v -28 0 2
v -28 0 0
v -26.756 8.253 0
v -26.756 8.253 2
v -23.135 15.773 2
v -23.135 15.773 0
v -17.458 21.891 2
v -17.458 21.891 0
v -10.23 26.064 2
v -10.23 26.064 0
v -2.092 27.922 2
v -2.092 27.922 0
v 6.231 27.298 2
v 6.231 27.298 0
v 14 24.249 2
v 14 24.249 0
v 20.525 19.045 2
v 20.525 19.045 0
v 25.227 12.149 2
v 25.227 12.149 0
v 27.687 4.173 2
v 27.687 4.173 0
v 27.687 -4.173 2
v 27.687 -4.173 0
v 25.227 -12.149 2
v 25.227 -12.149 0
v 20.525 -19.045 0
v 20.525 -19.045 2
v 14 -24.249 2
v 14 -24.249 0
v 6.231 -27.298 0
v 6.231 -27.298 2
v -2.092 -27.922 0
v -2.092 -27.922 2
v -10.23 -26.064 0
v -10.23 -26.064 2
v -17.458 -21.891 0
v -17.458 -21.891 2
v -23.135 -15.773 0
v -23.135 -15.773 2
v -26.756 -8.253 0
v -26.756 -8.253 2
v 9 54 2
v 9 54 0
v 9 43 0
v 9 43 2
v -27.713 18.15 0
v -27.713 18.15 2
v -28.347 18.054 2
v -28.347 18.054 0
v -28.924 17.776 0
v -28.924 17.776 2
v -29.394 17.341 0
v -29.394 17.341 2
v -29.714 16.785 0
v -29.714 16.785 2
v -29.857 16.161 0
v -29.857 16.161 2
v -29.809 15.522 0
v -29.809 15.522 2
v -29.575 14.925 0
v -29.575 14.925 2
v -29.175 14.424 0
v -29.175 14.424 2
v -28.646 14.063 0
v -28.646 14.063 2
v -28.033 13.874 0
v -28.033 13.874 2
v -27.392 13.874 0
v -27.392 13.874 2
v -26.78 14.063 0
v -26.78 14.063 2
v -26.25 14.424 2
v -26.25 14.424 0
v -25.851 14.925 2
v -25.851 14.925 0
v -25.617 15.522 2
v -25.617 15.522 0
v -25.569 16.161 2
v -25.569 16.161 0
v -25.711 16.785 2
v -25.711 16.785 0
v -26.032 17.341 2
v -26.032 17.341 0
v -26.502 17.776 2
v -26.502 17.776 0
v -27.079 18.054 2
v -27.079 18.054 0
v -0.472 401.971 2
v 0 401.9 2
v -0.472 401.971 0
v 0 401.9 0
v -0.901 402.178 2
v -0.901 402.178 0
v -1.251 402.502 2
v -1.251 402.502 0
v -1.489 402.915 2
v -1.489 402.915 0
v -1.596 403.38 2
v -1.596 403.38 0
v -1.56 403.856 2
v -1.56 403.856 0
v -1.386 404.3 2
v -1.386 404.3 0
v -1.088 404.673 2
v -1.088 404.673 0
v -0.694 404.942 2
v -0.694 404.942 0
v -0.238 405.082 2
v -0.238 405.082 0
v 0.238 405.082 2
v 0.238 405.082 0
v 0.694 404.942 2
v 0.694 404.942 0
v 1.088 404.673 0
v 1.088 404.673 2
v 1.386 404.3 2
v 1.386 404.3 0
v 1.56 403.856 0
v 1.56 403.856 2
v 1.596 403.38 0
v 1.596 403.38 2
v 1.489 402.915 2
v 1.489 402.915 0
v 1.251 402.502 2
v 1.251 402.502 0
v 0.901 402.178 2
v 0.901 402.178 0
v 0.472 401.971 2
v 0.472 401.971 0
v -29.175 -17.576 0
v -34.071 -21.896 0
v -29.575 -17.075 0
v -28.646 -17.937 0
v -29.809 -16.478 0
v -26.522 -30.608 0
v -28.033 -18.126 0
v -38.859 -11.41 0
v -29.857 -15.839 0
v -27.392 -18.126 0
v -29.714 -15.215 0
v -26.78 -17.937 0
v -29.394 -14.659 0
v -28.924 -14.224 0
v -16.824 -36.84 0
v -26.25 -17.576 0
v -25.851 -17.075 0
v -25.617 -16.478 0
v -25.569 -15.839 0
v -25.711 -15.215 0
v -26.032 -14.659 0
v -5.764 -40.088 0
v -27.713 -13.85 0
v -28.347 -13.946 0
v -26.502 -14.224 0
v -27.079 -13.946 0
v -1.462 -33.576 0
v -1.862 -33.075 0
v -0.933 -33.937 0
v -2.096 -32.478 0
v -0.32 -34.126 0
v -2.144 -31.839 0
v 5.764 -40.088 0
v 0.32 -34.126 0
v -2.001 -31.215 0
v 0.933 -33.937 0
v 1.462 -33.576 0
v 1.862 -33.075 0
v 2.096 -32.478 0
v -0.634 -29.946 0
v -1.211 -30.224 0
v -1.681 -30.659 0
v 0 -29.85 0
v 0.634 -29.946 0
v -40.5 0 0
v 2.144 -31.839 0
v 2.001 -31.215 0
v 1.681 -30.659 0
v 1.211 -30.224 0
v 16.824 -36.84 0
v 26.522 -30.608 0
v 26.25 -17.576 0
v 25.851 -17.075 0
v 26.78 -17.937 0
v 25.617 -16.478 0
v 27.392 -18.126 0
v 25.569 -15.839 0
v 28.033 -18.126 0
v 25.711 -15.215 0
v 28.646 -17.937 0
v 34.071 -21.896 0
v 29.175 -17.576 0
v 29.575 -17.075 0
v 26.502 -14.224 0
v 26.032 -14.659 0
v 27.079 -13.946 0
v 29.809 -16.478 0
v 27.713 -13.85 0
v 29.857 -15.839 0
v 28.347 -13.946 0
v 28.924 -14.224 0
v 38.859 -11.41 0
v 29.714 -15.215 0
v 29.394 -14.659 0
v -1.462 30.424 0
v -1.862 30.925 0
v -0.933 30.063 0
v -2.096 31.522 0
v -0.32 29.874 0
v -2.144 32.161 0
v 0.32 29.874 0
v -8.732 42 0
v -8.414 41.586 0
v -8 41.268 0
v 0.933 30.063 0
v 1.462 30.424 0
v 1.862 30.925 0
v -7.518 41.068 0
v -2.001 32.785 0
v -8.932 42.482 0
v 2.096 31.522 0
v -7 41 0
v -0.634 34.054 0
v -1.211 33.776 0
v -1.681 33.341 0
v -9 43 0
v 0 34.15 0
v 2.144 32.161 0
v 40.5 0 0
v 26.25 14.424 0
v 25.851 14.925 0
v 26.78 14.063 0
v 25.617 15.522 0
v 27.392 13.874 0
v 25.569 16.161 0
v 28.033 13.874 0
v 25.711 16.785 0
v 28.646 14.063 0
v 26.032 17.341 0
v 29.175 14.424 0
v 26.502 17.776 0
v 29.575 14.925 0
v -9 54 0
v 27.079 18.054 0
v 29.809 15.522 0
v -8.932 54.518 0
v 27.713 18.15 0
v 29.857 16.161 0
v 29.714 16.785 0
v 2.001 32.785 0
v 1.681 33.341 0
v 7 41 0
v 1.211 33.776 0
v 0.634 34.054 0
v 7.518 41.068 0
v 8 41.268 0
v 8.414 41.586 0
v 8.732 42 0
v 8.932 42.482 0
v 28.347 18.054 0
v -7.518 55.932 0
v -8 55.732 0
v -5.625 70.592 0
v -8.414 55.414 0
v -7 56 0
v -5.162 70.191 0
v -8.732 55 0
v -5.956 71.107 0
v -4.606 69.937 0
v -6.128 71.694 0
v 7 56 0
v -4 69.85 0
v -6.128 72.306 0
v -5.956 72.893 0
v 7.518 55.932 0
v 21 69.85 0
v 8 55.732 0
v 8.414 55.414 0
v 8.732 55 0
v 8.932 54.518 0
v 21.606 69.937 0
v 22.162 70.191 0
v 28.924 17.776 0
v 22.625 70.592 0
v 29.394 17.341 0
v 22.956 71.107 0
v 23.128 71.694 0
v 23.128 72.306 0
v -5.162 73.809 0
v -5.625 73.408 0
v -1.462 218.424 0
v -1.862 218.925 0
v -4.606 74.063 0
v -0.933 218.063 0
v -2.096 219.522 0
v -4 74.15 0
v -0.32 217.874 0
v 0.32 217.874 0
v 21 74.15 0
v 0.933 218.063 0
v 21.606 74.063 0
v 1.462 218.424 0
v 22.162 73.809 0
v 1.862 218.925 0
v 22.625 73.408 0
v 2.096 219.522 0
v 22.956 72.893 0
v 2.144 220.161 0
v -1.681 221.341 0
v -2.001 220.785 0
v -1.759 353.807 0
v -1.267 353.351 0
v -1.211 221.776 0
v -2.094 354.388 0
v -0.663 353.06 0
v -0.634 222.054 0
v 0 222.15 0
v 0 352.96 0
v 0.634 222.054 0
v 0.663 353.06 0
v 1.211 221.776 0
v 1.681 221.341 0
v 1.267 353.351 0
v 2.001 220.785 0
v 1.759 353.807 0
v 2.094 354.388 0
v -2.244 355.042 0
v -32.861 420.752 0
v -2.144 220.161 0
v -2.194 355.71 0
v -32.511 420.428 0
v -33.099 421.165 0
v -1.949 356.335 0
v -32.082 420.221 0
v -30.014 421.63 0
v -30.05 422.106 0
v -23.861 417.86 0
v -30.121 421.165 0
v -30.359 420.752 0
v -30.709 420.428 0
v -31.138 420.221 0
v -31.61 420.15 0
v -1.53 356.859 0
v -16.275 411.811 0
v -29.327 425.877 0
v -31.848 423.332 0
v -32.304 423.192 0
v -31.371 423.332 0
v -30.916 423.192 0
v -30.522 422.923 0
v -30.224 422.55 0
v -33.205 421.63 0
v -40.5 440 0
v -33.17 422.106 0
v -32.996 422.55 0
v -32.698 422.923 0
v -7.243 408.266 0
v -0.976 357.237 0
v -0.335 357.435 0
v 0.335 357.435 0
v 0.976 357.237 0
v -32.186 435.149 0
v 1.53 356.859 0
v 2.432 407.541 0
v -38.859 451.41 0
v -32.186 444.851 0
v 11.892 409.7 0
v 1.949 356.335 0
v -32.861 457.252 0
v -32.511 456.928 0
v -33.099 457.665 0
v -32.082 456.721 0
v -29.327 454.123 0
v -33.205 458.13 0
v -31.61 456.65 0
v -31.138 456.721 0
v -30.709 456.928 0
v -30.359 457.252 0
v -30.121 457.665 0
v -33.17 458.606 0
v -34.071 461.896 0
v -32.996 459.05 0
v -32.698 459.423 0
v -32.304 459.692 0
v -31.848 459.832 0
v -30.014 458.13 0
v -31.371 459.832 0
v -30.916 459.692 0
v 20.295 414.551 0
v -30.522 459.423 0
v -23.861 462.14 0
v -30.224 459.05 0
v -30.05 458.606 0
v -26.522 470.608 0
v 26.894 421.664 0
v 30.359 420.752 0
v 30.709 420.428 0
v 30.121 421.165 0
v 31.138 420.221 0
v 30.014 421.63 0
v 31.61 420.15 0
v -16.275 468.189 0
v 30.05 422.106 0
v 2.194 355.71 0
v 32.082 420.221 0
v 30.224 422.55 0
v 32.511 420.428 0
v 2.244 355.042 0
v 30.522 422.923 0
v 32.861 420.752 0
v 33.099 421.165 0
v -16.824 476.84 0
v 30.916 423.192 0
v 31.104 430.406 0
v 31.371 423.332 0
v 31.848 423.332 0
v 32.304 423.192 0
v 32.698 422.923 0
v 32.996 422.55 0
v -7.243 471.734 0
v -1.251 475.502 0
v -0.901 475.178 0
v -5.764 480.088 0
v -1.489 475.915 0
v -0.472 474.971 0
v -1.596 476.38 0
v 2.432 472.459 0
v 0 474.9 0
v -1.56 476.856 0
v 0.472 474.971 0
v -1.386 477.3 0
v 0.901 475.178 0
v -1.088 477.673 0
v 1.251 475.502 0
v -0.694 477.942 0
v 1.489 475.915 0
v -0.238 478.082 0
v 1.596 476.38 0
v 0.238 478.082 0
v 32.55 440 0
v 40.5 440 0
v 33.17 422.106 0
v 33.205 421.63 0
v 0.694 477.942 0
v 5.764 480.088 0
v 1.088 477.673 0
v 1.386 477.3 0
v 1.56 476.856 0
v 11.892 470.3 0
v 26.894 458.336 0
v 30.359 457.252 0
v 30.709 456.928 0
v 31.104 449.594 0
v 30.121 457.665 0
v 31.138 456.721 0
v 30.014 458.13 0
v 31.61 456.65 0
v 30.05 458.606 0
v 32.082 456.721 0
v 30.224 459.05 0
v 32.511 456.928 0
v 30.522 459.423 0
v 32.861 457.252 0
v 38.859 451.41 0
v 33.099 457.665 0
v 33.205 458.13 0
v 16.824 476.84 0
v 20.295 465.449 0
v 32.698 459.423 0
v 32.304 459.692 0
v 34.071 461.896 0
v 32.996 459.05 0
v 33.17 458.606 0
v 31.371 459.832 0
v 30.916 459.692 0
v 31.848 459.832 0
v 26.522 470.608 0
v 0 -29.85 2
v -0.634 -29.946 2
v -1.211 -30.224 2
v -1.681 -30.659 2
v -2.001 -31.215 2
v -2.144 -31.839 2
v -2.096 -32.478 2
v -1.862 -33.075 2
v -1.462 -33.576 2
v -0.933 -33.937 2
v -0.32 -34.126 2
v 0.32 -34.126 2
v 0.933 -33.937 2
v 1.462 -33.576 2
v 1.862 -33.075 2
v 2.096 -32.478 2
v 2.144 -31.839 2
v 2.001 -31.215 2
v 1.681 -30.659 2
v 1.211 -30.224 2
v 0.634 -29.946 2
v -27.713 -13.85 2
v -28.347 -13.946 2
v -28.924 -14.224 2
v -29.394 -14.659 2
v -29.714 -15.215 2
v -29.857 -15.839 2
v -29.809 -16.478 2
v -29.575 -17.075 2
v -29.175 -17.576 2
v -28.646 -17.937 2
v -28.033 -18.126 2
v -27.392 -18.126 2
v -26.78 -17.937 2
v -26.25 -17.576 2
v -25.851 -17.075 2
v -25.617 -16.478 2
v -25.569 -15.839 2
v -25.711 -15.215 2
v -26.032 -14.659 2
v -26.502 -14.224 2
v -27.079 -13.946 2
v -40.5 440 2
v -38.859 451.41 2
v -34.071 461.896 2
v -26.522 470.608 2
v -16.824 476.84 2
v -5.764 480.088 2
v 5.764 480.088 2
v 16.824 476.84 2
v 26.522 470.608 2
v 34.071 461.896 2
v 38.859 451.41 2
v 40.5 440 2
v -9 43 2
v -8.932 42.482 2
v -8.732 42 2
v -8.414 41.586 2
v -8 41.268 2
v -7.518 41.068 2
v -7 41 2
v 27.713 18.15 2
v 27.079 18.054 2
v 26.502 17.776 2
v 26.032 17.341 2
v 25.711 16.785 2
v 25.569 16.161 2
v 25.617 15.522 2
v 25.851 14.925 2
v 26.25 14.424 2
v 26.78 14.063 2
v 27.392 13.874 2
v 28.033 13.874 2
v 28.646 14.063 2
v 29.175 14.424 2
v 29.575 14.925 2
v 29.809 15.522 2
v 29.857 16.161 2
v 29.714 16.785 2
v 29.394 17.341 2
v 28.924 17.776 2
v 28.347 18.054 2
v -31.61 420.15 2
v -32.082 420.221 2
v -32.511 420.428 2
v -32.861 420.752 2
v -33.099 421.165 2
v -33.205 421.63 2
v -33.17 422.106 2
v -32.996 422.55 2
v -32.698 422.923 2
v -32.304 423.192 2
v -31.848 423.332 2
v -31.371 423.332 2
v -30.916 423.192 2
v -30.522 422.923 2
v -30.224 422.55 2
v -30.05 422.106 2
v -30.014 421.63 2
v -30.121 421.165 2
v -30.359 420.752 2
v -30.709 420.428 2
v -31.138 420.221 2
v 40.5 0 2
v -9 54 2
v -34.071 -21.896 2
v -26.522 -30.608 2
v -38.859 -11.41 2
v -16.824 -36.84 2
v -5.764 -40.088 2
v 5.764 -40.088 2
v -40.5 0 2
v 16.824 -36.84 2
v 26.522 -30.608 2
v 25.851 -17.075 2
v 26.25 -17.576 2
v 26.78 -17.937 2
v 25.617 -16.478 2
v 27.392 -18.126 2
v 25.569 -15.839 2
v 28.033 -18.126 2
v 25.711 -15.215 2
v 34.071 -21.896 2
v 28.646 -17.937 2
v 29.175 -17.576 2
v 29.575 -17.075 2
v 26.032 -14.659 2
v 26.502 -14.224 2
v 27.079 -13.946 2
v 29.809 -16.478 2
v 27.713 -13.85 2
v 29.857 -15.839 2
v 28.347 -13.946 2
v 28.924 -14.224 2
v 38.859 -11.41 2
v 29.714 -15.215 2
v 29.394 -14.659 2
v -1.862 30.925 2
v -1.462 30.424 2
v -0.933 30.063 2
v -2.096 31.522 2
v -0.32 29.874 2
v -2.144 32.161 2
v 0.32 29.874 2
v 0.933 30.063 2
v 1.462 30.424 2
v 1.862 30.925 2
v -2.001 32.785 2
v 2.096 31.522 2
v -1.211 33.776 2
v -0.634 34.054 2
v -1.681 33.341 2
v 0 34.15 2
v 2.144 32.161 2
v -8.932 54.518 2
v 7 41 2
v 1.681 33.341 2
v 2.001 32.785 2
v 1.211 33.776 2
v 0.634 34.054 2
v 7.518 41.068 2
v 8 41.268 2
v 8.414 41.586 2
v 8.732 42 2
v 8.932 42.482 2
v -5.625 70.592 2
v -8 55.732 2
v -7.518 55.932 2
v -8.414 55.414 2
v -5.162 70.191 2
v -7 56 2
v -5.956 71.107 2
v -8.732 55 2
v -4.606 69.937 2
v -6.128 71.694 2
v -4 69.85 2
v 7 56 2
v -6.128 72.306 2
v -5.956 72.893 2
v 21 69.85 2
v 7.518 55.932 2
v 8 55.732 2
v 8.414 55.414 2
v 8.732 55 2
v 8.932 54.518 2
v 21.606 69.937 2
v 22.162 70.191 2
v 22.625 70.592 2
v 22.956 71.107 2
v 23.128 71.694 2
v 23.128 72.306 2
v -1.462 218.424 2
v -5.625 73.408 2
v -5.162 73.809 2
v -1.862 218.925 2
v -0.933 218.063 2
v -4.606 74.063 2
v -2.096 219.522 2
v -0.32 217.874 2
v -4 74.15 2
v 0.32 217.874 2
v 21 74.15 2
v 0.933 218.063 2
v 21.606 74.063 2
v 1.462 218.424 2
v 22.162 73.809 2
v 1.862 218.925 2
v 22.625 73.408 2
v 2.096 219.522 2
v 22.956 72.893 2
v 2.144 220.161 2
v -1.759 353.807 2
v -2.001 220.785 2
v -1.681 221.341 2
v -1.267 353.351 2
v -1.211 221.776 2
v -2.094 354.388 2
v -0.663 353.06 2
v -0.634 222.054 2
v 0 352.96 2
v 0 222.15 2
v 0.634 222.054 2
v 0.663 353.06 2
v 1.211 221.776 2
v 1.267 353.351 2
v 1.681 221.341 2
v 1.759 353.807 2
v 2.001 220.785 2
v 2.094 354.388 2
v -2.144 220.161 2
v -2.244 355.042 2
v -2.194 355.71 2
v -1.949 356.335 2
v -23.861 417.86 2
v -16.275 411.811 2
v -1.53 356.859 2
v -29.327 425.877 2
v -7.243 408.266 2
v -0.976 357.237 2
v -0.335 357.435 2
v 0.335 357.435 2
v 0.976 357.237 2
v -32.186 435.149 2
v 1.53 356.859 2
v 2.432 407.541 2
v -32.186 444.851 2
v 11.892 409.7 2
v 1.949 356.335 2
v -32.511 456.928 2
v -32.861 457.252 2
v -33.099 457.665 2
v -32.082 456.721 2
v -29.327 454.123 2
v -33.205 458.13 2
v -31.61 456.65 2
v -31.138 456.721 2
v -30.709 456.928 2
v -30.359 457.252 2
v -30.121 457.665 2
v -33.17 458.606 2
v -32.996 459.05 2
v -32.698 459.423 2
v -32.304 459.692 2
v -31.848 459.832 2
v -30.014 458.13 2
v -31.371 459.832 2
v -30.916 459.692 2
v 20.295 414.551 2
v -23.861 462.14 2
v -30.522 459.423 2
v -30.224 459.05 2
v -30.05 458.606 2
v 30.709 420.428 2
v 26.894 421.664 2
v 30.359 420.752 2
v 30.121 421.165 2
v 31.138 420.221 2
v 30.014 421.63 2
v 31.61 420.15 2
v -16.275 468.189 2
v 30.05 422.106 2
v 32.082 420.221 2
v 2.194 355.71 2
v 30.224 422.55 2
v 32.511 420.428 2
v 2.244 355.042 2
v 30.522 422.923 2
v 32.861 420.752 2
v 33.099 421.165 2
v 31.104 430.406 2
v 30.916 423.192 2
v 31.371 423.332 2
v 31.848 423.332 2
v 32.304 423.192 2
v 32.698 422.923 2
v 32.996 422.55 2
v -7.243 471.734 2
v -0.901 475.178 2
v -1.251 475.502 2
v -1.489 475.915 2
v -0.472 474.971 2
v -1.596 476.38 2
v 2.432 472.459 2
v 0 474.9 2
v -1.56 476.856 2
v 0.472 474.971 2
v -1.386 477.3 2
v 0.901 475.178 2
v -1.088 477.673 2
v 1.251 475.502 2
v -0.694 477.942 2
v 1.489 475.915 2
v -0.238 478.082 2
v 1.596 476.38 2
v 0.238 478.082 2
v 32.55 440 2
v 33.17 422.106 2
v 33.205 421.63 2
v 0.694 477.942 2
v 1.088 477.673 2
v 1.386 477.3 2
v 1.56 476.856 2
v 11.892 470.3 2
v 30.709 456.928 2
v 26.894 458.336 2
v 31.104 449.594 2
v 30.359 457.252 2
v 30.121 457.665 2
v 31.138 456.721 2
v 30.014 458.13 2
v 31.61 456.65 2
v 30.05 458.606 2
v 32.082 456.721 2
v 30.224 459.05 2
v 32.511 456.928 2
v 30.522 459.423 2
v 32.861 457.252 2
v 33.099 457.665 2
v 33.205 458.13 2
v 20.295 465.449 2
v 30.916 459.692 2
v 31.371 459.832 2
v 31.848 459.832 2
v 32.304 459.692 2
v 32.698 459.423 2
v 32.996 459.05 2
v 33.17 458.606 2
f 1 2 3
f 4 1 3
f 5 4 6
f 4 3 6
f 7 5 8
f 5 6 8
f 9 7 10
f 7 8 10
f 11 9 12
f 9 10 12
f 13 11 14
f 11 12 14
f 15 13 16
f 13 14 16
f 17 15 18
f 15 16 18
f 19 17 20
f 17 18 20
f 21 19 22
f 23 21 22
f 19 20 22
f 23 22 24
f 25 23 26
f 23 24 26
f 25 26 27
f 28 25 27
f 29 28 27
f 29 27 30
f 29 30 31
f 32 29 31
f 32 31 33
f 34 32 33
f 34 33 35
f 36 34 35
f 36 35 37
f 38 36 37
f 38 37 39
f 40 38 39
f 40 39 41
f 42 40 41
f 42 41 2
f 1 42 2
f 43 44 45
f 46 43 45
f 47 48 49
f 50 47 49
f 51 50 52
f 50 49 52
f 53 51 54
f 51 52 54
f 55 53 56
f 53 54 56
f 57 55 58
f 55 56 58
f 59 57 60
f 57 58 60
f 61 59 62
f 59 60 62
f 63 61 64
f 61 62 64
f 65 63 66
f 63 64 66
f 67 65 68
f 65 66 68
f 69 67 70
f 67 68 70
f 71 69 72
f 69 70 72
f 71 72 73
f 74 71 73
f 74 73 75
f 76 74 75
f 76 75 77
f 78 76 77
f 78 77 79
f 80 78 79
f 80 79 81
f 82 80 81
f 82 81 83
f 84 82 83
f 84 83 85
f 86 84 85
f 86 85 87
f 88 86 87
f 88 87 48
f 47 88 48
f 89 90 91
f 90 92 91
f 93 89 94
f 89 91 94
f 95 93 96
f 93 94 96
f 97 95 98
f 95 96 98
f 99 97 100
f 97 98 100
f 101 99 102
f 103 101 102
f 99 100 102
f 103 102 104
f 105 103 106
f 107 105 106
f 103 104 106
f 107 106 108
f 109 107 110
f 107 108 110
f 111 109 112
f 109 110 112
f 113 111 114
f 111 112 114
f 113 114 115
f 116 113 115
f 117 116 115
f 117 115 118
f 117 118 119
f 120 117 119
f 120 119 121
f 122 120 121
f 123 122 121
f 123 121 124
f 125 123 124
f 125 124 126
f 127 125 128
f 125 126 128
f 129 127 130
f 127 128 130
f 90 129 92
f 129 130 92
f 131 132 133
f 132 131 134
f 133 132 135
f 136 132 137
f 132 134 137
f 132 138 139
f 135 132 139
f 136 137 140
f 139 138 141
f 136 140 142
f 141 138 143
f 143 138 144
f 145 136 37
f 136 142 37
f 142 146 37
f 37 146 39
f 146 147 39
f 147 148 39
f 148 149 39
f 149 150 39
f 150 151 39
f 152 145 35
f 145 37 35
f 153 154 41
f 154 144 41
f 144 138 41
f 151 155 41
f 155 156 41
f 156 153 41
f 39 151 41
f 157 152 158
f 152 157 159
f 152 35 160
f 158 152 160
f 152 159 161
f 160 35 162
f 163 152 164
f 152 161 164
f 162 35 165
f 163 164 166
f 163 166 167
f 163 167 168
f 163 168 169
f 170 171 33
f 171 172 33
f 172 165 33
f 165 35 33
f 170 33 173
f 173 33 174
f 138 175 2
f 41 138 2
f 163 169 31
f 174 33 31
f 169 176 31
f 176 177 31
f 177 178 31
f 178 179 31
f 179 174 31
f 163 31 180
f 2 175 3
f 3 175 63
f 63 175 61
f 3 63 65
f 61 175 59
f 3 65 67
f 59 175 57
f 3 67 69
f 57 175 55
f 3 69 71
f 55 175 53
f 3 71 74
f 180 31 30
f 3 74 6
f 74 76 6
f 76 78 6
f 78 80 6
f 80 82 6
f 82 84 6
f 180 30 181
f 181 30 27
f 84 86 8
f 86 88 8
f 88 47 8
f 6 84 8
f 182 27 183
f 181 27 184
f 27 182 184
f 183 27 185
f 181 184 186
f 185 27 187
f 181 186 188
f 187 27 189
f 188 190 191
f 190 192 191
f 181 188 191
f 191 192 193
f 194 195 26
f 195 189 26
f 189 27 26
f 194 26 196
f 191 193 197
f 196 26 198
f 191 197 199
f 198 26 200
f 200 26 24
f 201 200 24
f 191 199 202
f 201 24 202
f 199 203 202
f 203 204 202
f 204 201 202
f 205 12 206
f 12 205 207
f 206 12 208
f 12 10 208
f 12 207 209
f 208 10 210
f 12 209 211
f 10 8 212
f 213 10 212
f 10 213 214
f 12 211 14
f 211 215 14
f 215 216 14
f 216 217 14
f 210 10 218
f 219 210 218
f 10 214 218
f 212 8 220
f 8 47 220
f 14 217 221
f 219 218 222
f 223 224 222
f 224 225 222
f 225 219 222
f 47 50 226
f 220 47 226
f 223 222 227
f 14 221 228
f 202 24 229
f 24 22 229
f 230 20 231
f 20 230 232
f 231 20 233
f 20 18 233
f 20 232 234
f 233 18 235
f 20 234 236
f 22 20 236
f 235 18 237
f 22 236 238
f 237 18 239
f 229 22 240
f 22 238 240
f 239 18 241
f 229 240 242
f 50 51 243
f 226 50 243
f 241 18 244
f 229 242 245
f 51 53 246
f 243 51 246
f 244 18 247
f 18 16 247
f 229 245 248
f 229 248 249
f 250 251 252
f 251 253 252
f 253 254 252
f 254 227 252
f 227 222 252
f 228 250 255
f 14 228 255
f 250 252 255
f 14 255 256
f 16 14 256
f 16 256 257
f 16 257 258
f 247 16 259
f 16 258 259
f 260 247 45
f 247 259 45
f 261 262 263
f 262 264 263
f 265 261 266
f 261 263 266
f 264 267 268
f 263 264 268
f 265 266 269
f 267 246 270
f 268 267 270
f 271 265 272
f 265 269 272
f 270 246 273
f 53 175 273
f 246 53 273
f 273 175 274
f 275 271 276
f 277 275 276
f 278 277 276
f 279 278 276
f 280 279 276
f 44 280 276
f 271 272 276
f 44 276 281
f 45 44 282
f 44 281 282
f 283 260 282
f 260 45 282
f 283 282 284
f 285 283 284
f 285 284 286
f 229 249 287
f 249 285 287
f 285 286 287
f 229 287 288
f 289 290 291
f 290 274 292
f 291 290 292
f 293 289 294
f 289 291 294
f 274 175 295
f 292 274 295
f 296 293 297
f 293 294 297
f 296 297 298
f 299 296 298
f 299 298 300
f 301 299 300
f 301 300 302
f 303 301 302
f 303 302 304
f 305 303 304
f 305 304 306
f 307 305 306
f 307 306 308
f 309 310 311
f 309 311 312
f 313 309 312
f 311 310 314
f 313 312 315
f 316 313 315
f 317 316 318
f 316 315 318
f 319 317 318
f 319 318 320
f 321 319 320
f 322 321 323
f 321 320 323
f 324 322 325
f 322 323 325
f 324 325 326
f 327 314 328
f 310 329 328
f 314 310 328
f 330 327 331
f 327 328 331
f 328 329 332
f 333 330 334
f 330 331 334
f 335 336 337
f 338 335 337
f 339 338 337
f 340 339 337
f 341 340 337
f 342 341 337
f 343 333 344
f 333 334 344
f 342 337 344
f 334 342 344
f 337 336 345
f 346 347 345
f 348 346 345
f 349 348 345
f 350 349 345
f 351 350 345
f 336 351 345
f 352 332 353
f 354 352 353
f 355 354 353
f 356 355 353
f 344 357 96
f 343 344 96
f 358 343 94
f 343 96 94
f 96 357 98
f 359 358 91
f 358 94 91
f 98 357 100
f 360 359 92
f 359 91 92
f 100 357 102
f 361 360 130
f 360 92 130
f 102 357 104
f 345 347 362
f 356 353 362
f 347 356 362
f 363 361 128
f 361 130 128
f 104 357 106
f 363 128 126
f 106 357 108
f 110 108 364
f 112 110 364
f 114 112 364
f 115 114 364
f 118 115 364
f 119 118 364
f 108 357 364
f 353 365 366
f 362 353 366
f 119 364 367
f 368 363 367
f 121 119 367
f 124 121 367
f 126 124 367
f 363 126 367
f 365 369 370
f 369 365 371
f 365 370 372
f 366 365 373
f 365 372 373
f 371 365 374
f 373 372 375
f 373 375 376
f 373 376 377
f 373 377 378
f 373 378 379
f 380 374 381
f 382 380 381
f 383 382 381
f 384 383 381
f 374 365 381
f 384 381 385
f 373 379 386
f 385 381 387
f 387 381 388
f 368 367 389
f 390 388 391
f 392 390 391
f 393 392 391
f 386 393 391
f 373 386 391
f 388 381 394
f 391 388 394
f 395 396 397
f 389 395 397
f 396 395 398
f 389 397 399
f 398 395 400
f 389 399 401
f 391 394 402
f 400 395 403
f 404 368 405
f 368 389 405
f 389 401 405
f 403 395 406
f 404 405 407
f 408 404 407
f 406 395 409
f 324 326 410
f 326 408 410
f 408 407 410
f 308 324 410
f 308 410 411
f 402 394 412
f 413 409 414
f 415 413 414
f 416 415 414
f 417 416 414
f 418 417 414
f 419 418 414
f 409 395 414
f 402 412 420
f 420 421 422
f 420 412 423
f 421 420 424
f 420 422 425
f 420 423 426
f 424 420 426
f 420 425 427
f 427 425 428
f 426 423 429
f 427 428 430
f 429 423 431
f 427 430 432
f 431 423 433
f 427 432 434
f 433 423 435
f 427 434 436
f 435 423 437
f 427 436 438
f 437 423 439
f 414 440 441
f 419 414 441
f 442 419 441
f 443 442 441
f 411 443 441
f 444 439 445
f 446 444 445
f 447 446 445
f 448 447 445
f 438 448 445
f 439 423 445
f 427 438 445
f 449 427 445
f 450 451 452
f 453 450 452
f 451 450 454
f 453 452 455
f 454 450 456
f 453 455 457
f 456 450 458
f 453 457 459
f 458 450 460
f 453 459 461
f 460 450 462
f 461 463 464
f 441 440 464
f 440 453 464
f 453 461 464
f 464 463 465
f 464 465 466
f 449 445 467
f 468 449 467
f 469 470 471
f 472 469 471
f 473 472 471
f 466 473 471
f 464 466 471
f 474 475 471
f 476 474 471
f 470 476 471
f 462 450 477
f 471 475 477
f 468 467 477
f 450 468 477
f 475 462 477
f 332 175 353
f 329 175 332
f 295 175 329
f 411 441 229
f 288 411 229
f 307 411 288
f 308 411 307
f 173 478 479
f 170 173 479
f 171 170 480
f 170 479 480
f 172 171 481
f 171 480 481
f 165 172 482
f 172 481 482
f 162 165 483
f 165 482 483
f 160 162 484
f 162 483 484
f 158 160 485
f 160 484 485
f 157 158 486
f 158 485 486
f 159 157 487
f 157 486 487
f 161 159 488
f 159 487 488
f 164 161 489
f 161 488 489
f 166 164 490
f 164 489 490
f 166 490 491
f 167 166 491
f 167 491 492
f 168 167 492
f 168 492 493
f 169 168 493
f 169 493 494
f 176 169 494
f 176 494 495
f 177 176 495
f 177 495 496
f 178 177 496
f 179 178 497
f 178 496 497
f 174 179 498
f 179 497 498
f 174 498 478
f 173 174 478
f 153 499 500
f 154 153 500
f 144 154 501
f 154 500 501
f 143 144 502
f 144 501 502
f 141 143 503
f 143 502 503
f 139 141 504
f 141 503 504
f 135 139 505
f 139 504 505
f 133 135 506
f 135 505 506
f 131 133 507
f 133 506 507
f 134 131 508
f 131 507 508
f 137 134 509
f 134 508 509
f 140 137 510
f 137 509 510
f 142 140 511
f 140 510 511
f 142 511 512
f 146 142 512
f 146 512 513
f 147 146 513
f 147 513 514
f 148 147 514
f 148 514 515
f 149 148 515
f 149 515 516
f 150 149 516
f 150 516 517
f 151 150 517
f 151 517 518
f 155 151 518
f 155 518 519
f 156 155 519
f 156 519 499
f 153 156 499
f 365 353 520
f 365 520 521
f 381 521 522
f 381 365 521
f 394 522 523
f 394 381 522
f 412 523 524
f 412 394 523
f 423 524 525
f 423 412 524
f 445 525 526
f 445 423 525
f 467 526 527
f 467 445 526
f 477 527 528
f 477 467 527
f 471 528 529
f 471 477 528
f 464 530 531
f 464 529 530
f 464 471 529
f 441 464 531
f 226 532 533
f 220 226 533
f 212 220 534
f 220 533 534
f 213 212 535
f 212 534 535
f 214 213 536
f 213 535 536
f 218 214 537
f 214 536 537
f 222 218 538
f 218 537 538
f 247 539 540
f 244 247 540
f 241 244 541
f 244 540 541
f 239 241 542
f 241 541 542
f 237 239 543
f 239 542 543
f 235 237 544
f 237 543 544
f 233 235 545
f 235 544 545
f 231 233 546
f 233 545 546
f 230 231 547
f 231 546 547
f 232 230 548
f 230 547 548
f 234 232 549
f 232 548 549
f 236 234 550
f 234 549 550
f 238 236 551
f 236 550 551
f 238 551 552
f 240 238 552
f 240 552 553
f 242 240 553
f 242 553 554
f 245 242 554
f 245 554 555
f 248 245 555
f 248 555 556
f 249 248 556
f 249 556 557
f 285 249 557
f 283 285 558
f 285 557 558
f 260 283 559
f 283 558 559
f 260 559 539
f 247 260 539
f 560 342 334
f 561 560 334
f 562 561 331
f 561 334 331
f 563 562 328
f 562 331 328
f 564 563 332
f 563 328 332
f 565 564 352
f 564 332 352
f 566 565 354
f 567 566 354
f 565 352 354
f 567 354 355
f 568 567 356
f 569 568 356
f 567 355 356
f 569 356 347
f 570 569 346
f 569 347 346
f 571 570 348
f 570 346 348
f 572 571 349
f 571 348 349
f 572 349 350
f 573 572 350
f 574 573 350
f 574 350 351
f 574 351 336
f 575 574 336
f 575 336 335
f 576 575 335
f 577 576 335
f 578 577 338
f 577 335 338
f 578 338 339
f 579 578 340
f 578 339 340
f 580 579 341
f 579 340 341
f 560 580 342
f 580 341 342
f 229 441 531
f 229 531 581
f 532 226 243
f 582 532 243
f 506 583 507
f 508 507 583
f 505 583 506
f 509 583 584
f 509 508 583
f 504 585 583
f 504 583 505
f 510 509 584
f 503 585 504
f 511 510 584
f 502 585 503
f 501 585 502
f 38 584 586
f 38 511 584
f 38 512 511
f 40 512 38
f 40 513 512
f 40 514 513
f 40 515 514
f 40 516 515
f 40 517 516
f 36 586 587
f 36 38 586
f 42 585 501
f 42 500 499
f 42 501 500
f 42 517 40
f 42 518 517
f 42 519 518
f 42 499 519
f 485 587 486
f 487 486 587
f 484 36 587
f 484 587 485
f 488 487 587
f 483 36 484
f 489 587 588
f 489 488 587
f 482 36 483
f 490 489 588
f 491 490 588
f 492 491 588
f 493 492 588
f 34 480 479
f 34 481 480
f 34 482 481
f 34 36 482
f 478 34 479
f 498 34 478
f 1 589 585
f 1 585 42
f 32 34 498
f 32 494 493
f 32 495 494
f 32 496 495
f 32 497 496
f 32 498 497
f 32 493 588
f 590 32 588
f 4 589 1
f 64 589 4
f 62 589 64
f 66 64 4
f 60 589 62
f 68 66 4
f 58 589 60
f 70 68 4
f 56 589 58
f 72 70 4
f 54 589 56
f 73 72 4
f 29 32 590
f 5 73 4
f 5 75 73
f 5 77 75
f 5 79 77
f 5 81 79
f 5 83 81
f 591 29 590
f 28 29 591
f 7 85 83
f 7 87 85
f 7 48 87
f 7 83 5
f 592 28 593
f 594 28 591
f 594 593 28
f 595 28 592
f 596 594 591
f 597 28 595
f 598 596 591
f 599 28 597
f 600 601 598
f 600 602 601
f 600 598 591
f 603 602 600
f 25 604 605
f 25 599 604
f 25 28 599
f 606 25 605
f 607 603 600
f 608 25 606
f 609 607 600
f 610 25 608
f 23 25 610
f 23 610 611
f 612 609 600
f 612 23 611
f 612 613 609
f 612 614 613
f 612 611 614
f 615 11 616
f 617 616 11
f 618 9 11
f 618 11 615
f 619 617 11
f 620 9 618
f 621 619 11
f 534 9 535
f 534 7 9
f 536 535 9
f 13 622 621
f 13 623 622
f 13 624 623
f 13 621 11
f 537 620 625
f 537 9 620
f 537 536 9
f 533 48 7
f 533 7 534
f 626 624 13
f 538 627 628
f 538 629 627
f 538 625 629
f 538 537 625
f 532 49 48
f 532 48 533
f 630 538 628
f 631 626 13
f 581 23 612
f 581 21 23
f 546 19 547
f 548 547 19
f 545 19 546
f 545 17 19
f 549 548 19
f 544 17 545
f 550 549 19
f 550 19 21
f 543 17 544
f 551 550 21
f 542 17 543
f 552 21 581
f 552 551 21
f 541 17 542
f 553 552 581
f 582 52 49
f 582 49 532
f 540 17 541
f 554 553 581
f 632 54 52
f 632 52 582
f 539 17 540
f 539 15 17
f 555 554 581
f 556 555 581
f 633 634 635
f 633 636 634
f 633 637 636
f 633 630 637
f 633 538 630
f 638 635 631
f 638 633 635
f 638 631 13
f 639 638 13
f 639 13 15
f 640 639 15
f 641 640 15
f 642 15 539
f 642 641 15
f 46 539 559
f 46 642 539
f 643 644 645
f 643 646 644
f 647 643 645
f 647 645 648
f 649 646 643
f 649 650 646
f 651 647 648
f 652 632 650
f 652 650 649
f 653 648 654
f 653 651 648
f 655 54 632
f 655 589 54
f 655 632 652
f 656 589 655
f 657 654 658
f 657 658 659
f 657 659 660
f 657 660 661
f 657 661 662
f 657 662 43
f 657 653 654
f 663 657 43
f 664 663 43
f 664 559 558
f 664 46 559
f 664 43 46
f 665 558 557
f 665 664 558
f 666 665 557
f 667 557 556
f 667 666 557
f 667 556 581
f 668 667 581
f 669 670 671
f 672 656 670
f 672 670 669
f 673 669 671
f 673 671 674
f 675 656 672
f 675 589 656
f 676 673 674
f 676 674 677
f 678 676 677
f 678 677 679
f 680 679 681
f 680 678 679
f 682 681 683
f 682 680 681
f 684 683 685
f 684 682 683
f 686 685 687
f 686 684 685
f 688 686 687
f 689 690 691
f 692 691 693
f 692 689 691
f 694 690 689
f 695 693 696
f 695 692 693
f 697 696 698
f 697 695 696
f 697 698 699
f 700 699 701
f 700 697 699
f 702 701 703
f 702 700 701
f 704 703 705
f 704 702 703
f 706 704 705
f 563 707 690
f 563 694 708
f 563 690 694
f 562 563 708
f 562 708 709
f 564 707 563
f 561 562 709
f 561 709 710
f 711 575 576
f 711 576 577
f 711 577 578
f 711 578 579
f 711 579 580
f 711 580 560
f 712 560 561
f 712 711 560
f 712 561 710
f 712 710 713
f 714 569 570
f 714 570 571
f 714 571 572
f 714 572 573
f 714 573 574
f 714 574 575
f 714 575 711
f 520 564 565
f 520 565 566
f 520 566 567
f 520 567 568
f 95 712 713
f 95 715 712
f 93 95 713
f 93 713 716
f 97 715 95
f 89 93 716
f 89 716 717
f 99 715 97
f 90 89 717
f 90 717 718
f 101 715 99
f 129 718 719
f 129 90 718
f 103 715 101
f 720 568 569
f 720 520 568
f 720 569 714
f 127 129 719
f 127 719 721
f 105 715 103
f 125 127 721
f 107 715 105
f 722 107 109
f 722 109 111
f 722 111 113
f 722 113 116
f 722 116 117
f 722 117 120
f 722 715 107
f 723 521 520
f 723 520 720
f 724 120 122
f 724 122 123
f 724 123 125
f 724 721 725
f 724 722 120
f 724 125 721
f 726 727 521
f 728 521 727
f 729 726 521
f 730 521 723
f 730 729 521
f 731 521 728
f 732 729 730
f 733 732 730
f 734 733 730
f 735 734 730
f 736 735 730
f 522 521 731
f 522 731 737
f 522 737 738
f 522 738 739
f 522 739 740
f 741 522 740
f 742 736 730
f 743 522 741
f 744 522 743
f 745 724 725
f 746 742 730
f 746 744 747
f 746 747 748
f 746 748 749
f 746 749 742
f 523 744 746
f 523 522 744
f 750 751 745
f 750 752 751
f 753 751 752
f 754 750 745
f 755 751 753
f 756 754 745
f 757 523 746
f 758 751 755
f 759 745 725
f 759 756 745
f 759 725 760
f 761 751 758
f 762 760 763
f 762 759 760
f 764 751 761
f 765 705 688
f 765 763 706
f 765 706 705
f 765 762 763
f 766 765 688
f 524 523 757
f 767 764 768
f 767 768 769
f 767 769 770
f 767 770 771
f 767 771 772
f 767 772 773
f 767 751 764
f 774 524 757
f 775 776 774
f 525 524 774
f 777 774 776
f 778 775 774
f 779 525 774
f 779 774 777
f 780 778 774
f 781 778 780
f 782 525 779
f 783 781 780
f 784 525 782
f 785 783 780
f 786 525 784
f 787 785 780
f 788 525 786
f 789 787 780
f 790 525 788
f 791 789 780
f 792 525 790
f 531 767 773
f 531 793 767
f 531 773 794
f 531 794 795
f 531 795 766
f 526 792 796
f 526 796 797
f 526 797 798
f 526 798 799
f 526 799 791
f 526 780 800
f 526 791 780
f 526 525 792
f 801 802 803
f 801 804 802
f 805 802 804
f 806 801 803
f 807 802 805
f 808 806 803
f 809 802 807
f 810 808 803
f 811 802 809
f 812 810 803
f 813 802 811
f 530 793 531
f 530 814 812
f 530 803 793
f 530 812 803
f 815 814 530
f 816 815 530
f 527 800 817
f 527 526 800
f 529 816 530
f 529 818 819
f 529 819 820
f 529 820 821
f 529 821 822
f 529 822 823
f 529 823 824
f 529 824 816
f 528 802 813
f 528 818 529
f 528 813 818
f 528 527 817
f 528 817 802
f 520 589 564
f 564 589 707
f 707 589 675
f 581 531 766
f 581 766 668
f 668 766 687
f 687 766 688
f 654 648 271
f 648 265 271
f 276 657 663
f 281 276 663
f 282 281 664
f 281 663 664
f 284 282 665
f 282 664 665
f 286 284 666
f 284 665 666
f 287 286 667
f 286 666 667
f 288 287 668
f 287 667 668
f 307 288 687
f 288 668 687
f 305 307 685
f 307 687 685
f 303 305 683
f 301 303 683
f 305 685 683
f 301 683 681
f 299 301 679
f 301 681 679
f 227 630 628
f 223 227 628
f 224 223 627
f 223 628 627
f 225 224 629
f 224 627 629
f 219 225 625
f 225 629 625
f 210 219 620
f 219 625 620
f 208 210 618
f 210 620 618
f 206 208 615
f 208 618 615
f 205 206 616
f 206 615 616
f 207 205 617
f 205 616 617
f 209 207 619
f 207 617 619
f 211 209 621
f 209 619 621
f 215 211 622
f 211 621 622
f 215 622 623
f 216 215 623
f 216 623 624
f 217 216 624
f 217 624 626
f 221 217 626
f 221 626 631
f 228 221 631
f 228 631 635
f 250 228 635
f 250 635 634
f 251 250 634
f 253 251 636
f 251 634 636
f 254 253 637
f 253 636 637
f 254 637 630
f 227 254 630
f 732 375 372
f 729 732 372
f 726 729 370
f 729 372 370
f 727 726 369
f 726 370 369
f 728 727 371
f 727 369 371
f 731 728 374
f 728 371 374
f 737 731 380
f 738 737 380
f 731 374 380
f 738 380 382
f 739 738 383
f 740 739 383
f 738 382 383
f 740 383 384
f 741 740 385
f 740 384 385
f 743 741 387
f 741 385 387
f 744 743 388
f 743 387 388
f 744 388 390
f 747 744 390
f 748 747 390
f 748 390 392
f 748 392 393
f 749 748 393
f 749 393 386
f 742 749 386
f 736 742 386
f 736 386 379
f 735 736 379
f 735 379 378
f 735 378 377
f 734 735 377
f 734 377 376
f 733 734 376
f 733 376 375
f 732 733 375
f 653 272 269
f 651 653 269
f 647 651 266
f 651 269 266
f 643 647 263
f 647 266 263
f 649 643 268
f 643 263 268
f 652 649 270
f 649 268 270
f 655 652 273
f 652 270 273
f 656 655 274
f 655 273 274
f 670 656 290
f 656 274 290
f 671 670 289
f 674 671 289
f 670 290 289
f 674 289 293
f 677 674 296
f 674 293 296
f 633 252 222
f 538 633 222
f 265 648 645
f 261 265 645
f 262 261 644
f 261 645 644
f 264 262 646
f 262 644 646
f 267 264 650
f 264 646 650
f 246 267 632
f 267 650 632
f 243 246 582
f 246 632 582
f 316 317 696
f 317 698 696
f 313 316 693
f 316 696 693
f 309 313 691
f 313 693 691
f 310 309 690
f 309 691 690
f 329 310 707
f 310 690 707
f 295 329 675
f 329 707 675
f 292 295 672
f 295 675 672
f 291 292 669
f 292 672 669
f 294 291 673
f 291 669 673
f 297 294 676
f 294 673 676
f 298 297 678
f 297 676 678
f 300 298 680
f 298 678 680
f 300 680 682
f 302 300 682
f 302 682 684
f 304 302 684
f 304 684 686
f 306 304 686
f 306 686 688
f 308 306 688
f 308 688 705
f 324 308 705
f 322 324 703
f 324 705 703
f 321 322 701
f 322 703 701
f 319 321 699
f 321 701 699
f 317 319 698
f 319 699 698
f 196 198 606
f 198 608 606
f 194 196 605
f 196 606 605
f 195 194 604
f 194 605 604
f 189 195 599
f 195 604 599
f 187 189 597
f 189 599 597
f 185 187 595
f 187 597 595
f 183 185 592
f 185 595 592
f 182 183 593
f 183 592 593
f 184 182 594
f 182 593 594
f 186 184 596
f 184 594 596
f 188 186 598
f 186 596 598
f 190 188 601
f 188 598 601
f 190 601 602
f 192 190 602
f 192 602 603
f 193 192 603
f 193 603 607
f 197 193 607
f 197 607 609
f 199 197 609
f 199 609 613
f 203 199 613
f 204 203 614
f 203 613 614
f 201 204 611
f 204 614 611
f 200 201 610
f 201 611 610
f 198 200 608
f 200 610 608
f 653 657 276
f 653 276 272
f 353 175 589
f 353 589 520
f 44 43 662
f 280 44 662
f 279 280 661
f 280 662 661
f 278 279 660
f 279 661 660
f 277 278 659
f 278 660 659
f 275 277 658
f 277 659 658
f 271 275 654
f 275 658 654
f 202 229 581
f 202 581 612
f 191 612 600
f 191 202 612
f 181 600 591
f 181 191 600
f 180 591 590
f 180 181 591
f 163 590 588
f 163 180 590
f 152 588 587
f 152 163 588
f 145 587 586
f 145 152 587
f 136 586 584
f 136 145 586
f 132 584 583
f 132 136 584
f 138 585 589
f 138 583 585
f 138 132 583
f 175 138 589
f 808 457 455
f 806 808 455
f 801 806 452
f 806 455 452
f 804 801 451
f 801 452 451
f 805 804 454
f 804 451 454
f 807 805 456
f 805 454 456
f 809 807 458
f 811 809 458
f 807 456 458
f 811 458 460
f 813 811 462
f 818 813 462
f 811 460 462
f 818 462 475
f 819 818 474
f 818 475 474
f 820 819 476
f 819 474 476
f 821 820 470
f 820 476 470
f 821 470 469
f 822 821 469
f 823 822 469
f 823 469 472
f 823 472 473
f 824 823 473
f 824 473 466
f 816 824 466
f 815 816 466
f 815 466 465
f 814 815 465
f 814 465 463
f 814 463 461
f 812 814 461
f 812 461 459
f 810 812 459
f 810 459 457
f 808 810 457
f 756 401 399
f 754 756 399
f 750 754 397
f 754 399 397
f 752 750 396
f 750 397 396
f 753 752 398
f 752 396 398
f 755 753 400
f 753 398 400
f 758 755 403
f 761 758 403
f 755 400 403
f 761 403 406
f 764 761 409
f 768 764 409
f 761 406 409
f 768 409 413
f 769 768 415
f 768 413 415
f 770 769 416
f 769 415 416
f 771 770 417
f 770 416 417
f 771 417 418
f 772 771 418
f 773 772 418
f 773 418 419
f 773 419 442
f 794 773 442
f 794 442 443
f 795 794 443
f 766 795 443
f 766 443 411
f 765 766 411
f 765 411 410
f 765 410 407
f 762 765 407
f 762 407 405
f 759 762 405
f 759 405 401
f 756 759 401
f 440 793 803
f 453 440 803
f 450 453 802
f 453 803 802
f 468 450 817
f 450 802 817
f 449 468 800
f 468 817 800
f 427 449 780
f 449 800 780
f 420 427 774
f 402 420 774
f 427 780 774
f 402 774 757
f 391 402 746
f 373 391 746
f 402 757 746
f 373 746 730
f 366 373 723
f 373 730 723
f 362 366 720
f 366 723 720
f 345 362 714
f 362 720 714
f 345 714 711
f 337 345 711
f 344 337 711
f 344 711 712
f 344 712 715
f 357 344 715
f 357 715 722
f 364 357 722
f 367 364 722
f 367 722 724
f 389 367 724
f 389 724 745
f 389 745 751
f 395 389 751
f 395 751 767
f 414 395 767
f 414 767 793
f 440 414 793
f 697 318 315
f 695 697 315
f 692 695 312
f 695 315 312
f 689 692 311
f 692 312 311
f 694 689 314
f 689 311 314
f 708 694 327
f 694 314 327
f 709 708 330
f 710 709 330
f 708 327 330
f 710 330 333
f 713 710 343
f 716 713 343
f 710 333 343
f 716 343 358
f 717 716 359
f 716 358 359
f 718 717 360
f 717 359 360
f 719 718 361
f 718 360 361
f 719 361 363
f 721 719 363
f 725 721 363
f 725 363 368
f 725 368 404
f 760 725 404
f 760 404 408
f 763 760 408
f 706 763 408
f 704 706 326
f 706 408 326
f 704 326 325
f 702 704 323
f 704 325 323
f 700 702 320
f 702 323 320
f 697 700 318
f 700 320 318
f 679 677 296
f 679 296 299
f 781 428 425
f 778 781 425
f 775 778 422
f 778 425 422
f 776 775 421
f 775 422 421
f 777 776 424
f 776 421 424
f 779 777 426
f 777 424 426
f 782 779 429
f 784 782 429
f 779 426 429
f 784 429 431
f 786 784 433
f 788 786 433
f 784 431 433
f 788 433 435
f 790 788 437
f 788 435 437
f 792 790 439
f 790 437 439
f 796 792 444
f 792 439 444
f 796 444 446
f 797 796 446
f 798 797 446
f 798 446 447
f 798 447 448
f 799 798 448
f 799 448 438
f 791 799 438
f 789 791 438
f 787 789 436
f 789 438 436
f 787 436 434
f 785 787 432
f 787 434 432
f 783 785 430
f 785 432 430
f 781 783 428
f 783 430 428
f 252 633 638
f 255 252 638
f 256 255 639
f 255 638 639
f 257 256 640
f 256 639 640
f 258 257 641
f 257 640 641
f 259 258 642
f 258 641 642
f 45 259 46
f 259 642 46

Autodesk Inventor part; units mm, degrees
ref_plane "YZ Plane" through (0, 0, 0) normal (1, 0, 0) x (0, 1, 0)
ref_plane "XZ Plane" through (0, 0, 0) normal (0, 1, 0) x (-1, 0, 0)
ref_plane "XY Plane" through (0, 0, 0) normal (0, 0, 1) x (1, 0, 0)
sketch "スケッチ1" plane through (0, 0, 0) normal (0, 0, 1) x (1, 0, 0)
  circle A0 centre (0, 0) radius 40.5
  circle A1 centre (0, 440) radius 40.5
  line L0 (-40.5, 0) -> (-40.5, 440)
  line L1 (40.5, 440) -> (40.5, 0)
  dimension "d0" = 81
  dimension "d1" = 81
  dimension "d2" = 440
extrude "プレート1" add sketch "スケッチ1" along normal blind 2
sketch "スケッチ4" plane through (0, 0, 0) normal (0, 0, -1) x (-1, 0, 0)
  circle A0 centre (0, 0) radius 28
  dimension "d28" = 56
extrude "押し出し1" cut sketch "スケッチ4" against normal blind 10
sketch "スケッチ5" plane through (0, 0, 0) normal (0, 0, -1) x (-1, 0, 0)
  circle A0 centre (0, 0) radius 32
  point P0 (0, 32)
  point P1 (-27.7128, 16)
  point P2 (-27.7128, -16)
  point P3 (0, -32)
  point P4 (27.7128, -16)
  point P5 (27.7128, 16)
  dimension "d31" = 64
  dimension "d34" = 360
hole "穴3" at (0, 32, 0) at (27.7128, 16, 0) at (27.7128, -16, 0) at (0, -32, 0) at (-27.7128, -16, 0) at (-27.7128, 16, 0) direction (0, 0, 1) diameter 4.3 end through all clearance for "Flat Head Machine Screw" size "M4" standard "Ansi Metric M Profile"
sketch "スケッチ6" plane through (0, 0, 2) normal (0, 0, 1) x (1, 0, 0)
  arc A0 (40.5, 440) -> (-40.5, 440) centre (0, 440) ccw projected
  circle A1 centre (0, 440) radius 32.55
  point P0 (0, 0)
  dimension "d43" = 65.1
extrude "押し出し2" cut sketch "スケッチ6" against normal blind 10
sketch "スケッチ9" plane through (0, 0, 2) normal (0, 0, 1) x (1, 0, 0)
  arc A0 (40.5, 440) -> (-40.5, 440) centre (0, 440) ccw projected
  circle A1 centre (0, 440) radius 36.5
  point P0 (0, 0)
  point P1 (0, 476.5)
  point P2 (-31.6099, 458.25)
  point P3 (-31.6099, 421.75)
  point P4 (0, 403.5)
  point P5 (31.6099, 421.75)
  point P6 (31.6099, 458.25)
  dimension "d58" = 73
  dimension "d61" = 360
hole "穴5" at (0, 476.5, 2) at (-31.6099, 458.25, 2) at (-31.6099, 421.75, 2) at (0, 403.5, 2) at (31.6099, 421.75, 2) at (31.6099, 458.25, 2) direction (0, 0, -1) diameter 3.2 end through all clearance for "Socket Head Cap Screw" size "M3" standard "Ansi Metric M Profile"
sketch "スケッチ16" plane through (0, 0, 2) normal (0, 0, 1) x (1, 0, 0)
  circle A0 centre (0, 355.2097) radius 4
  arc A1 (40.5, 440) -> (-40.5, 440) centre (0, 440) ccw projected
  circle A2 centre (0, 440) radius 25
  line L0 (-23.4923, 431.4495) -> (4.1883, 355.3977)
  line L1 (0, 603.9) -> (0, -147.9) projected
  point P0 (0, 0)
  dimension "d154" = 50
  dimension "d135" = 8
  dimension "d136" = 0
  dimension "d137" = 160
hole "穴11" at (0, 355.2097, 2) direction (0, 0, -1) diameter 4.5 end through all clearance for "Flat Head Machine Screw" size "M4" standard "Ansi Metric M Profile"
sketch "スケッチ17" plane through (0, 0, 2) normal (0, 0, 1) x (1, 0, 0)
  circle A0 centre (0, 0) radius 44
  point P0 (-4, 72)
  dimension "d145" = 88
  dimension "d177" = 72
  dimension "d178" = 4
hole "穴12" at (-4, 72, 2) direction (0, 0, -1) diameter 4.3 end through all clearance for "Flat Head Machine Screw" size "M4" standard "Ansi Metric M Profile"
sketch "スケッチ18" plane through (0, 0, 0) normal (0, 0, -1) x (-1, 0, 0)
  line L0 (-9, 41) -> (9, 41)
  line L1 (9, 41) -> (9, 56)
  line L2 (9, 56) -> (-9, 56)
  line L3 (-9, 56) -> (-9, 41)
  line L4 (-9, 41) -> (9, 56) construction
  line L5 (9, 41) -> (-9, 56) construction
  arc A0 (40.5, 440) -> (-40.5, 440) centre (0, 440) ccw projected
  point P0 (0, 0)
  point P1 (0, 48.5)
  point P2 (0, 48.5)
  dimension "d157" = 18
  dimension "d158" = 15
  dimension "d183" = 41
extrude "押し出し4" cut sketch "スケッチ18" against normal blind 10
fillet "コーナーR2" radius 2 4 edges at (-9, 56, 1) (9, 56, 1) (9, 41, 1) (-9, 41, 1)
sketch "スケッチ19" plane through (0, 0, 2) normal (0, 0, 1) x (1, 0, 0)
  line L0 (21, 72) -> (-4, 72) construction
  line L1 (21, 69.85) -> (-4, 69.85)
  line L2 (-4, 74.15) -> (21, 74.15)
  arc A0 (21, 69.85) -> (21, 74.15) centre (21, 72) ccw
  arc A1 (-4, 74.15) -> (-4, 69.85) centre (-4, 72) ccw
  circle A2 centre (-4, 72) radius 2.15 projected
  point P0 (0, 0)
  point P1 (8.5, 72)
  dimension "d182" = 21
extrude "押し出し5" cut sketch "スケッチ19" against normal blind 10
sketch "スケッチ20" plane through (0, 0, 0) normal (0, 0, -1) x (-1, 0, 0)
  point P0 (0, 0)
  point P1 (0, 220)
  dimension "d167" = 220
hole "穴13" at (0, 220, 0) direction (0, 0, 1) diameter 4.3 end through all clearance for "Flat Head Machine Screw" size "M4" standard "Ansi Metric M Profile"
equation "\"d41\" = Thickness"
equation "\"d68\" = Thickness"
equation "\"d143\" = Thickness"
equation "\"d152\" = Thickness"
equation "\"d173\" = Thickness"
equation "\"d3\" = Thickness"
equation "\"BendRadius\" = Thickness"
equation "\"BendReliefWidth\" = Thickness"
equation "\"BendReliefDepth\" = 0.5 * Thickness"
equation "\"CornerReliefSize\" = 4 * Thickness"
equation "\"MinimumRemnant\" = 2 * Thickness"
equation "\"TransitionRadius\" = BendRadius"
equation "\"JacobiRadiusSize\" = Thickness"
equation "\"GapSize\" = Thickness"
equation "\"Thickness\" = 2"
properties part number "link2-plate2" material "CFRP"
